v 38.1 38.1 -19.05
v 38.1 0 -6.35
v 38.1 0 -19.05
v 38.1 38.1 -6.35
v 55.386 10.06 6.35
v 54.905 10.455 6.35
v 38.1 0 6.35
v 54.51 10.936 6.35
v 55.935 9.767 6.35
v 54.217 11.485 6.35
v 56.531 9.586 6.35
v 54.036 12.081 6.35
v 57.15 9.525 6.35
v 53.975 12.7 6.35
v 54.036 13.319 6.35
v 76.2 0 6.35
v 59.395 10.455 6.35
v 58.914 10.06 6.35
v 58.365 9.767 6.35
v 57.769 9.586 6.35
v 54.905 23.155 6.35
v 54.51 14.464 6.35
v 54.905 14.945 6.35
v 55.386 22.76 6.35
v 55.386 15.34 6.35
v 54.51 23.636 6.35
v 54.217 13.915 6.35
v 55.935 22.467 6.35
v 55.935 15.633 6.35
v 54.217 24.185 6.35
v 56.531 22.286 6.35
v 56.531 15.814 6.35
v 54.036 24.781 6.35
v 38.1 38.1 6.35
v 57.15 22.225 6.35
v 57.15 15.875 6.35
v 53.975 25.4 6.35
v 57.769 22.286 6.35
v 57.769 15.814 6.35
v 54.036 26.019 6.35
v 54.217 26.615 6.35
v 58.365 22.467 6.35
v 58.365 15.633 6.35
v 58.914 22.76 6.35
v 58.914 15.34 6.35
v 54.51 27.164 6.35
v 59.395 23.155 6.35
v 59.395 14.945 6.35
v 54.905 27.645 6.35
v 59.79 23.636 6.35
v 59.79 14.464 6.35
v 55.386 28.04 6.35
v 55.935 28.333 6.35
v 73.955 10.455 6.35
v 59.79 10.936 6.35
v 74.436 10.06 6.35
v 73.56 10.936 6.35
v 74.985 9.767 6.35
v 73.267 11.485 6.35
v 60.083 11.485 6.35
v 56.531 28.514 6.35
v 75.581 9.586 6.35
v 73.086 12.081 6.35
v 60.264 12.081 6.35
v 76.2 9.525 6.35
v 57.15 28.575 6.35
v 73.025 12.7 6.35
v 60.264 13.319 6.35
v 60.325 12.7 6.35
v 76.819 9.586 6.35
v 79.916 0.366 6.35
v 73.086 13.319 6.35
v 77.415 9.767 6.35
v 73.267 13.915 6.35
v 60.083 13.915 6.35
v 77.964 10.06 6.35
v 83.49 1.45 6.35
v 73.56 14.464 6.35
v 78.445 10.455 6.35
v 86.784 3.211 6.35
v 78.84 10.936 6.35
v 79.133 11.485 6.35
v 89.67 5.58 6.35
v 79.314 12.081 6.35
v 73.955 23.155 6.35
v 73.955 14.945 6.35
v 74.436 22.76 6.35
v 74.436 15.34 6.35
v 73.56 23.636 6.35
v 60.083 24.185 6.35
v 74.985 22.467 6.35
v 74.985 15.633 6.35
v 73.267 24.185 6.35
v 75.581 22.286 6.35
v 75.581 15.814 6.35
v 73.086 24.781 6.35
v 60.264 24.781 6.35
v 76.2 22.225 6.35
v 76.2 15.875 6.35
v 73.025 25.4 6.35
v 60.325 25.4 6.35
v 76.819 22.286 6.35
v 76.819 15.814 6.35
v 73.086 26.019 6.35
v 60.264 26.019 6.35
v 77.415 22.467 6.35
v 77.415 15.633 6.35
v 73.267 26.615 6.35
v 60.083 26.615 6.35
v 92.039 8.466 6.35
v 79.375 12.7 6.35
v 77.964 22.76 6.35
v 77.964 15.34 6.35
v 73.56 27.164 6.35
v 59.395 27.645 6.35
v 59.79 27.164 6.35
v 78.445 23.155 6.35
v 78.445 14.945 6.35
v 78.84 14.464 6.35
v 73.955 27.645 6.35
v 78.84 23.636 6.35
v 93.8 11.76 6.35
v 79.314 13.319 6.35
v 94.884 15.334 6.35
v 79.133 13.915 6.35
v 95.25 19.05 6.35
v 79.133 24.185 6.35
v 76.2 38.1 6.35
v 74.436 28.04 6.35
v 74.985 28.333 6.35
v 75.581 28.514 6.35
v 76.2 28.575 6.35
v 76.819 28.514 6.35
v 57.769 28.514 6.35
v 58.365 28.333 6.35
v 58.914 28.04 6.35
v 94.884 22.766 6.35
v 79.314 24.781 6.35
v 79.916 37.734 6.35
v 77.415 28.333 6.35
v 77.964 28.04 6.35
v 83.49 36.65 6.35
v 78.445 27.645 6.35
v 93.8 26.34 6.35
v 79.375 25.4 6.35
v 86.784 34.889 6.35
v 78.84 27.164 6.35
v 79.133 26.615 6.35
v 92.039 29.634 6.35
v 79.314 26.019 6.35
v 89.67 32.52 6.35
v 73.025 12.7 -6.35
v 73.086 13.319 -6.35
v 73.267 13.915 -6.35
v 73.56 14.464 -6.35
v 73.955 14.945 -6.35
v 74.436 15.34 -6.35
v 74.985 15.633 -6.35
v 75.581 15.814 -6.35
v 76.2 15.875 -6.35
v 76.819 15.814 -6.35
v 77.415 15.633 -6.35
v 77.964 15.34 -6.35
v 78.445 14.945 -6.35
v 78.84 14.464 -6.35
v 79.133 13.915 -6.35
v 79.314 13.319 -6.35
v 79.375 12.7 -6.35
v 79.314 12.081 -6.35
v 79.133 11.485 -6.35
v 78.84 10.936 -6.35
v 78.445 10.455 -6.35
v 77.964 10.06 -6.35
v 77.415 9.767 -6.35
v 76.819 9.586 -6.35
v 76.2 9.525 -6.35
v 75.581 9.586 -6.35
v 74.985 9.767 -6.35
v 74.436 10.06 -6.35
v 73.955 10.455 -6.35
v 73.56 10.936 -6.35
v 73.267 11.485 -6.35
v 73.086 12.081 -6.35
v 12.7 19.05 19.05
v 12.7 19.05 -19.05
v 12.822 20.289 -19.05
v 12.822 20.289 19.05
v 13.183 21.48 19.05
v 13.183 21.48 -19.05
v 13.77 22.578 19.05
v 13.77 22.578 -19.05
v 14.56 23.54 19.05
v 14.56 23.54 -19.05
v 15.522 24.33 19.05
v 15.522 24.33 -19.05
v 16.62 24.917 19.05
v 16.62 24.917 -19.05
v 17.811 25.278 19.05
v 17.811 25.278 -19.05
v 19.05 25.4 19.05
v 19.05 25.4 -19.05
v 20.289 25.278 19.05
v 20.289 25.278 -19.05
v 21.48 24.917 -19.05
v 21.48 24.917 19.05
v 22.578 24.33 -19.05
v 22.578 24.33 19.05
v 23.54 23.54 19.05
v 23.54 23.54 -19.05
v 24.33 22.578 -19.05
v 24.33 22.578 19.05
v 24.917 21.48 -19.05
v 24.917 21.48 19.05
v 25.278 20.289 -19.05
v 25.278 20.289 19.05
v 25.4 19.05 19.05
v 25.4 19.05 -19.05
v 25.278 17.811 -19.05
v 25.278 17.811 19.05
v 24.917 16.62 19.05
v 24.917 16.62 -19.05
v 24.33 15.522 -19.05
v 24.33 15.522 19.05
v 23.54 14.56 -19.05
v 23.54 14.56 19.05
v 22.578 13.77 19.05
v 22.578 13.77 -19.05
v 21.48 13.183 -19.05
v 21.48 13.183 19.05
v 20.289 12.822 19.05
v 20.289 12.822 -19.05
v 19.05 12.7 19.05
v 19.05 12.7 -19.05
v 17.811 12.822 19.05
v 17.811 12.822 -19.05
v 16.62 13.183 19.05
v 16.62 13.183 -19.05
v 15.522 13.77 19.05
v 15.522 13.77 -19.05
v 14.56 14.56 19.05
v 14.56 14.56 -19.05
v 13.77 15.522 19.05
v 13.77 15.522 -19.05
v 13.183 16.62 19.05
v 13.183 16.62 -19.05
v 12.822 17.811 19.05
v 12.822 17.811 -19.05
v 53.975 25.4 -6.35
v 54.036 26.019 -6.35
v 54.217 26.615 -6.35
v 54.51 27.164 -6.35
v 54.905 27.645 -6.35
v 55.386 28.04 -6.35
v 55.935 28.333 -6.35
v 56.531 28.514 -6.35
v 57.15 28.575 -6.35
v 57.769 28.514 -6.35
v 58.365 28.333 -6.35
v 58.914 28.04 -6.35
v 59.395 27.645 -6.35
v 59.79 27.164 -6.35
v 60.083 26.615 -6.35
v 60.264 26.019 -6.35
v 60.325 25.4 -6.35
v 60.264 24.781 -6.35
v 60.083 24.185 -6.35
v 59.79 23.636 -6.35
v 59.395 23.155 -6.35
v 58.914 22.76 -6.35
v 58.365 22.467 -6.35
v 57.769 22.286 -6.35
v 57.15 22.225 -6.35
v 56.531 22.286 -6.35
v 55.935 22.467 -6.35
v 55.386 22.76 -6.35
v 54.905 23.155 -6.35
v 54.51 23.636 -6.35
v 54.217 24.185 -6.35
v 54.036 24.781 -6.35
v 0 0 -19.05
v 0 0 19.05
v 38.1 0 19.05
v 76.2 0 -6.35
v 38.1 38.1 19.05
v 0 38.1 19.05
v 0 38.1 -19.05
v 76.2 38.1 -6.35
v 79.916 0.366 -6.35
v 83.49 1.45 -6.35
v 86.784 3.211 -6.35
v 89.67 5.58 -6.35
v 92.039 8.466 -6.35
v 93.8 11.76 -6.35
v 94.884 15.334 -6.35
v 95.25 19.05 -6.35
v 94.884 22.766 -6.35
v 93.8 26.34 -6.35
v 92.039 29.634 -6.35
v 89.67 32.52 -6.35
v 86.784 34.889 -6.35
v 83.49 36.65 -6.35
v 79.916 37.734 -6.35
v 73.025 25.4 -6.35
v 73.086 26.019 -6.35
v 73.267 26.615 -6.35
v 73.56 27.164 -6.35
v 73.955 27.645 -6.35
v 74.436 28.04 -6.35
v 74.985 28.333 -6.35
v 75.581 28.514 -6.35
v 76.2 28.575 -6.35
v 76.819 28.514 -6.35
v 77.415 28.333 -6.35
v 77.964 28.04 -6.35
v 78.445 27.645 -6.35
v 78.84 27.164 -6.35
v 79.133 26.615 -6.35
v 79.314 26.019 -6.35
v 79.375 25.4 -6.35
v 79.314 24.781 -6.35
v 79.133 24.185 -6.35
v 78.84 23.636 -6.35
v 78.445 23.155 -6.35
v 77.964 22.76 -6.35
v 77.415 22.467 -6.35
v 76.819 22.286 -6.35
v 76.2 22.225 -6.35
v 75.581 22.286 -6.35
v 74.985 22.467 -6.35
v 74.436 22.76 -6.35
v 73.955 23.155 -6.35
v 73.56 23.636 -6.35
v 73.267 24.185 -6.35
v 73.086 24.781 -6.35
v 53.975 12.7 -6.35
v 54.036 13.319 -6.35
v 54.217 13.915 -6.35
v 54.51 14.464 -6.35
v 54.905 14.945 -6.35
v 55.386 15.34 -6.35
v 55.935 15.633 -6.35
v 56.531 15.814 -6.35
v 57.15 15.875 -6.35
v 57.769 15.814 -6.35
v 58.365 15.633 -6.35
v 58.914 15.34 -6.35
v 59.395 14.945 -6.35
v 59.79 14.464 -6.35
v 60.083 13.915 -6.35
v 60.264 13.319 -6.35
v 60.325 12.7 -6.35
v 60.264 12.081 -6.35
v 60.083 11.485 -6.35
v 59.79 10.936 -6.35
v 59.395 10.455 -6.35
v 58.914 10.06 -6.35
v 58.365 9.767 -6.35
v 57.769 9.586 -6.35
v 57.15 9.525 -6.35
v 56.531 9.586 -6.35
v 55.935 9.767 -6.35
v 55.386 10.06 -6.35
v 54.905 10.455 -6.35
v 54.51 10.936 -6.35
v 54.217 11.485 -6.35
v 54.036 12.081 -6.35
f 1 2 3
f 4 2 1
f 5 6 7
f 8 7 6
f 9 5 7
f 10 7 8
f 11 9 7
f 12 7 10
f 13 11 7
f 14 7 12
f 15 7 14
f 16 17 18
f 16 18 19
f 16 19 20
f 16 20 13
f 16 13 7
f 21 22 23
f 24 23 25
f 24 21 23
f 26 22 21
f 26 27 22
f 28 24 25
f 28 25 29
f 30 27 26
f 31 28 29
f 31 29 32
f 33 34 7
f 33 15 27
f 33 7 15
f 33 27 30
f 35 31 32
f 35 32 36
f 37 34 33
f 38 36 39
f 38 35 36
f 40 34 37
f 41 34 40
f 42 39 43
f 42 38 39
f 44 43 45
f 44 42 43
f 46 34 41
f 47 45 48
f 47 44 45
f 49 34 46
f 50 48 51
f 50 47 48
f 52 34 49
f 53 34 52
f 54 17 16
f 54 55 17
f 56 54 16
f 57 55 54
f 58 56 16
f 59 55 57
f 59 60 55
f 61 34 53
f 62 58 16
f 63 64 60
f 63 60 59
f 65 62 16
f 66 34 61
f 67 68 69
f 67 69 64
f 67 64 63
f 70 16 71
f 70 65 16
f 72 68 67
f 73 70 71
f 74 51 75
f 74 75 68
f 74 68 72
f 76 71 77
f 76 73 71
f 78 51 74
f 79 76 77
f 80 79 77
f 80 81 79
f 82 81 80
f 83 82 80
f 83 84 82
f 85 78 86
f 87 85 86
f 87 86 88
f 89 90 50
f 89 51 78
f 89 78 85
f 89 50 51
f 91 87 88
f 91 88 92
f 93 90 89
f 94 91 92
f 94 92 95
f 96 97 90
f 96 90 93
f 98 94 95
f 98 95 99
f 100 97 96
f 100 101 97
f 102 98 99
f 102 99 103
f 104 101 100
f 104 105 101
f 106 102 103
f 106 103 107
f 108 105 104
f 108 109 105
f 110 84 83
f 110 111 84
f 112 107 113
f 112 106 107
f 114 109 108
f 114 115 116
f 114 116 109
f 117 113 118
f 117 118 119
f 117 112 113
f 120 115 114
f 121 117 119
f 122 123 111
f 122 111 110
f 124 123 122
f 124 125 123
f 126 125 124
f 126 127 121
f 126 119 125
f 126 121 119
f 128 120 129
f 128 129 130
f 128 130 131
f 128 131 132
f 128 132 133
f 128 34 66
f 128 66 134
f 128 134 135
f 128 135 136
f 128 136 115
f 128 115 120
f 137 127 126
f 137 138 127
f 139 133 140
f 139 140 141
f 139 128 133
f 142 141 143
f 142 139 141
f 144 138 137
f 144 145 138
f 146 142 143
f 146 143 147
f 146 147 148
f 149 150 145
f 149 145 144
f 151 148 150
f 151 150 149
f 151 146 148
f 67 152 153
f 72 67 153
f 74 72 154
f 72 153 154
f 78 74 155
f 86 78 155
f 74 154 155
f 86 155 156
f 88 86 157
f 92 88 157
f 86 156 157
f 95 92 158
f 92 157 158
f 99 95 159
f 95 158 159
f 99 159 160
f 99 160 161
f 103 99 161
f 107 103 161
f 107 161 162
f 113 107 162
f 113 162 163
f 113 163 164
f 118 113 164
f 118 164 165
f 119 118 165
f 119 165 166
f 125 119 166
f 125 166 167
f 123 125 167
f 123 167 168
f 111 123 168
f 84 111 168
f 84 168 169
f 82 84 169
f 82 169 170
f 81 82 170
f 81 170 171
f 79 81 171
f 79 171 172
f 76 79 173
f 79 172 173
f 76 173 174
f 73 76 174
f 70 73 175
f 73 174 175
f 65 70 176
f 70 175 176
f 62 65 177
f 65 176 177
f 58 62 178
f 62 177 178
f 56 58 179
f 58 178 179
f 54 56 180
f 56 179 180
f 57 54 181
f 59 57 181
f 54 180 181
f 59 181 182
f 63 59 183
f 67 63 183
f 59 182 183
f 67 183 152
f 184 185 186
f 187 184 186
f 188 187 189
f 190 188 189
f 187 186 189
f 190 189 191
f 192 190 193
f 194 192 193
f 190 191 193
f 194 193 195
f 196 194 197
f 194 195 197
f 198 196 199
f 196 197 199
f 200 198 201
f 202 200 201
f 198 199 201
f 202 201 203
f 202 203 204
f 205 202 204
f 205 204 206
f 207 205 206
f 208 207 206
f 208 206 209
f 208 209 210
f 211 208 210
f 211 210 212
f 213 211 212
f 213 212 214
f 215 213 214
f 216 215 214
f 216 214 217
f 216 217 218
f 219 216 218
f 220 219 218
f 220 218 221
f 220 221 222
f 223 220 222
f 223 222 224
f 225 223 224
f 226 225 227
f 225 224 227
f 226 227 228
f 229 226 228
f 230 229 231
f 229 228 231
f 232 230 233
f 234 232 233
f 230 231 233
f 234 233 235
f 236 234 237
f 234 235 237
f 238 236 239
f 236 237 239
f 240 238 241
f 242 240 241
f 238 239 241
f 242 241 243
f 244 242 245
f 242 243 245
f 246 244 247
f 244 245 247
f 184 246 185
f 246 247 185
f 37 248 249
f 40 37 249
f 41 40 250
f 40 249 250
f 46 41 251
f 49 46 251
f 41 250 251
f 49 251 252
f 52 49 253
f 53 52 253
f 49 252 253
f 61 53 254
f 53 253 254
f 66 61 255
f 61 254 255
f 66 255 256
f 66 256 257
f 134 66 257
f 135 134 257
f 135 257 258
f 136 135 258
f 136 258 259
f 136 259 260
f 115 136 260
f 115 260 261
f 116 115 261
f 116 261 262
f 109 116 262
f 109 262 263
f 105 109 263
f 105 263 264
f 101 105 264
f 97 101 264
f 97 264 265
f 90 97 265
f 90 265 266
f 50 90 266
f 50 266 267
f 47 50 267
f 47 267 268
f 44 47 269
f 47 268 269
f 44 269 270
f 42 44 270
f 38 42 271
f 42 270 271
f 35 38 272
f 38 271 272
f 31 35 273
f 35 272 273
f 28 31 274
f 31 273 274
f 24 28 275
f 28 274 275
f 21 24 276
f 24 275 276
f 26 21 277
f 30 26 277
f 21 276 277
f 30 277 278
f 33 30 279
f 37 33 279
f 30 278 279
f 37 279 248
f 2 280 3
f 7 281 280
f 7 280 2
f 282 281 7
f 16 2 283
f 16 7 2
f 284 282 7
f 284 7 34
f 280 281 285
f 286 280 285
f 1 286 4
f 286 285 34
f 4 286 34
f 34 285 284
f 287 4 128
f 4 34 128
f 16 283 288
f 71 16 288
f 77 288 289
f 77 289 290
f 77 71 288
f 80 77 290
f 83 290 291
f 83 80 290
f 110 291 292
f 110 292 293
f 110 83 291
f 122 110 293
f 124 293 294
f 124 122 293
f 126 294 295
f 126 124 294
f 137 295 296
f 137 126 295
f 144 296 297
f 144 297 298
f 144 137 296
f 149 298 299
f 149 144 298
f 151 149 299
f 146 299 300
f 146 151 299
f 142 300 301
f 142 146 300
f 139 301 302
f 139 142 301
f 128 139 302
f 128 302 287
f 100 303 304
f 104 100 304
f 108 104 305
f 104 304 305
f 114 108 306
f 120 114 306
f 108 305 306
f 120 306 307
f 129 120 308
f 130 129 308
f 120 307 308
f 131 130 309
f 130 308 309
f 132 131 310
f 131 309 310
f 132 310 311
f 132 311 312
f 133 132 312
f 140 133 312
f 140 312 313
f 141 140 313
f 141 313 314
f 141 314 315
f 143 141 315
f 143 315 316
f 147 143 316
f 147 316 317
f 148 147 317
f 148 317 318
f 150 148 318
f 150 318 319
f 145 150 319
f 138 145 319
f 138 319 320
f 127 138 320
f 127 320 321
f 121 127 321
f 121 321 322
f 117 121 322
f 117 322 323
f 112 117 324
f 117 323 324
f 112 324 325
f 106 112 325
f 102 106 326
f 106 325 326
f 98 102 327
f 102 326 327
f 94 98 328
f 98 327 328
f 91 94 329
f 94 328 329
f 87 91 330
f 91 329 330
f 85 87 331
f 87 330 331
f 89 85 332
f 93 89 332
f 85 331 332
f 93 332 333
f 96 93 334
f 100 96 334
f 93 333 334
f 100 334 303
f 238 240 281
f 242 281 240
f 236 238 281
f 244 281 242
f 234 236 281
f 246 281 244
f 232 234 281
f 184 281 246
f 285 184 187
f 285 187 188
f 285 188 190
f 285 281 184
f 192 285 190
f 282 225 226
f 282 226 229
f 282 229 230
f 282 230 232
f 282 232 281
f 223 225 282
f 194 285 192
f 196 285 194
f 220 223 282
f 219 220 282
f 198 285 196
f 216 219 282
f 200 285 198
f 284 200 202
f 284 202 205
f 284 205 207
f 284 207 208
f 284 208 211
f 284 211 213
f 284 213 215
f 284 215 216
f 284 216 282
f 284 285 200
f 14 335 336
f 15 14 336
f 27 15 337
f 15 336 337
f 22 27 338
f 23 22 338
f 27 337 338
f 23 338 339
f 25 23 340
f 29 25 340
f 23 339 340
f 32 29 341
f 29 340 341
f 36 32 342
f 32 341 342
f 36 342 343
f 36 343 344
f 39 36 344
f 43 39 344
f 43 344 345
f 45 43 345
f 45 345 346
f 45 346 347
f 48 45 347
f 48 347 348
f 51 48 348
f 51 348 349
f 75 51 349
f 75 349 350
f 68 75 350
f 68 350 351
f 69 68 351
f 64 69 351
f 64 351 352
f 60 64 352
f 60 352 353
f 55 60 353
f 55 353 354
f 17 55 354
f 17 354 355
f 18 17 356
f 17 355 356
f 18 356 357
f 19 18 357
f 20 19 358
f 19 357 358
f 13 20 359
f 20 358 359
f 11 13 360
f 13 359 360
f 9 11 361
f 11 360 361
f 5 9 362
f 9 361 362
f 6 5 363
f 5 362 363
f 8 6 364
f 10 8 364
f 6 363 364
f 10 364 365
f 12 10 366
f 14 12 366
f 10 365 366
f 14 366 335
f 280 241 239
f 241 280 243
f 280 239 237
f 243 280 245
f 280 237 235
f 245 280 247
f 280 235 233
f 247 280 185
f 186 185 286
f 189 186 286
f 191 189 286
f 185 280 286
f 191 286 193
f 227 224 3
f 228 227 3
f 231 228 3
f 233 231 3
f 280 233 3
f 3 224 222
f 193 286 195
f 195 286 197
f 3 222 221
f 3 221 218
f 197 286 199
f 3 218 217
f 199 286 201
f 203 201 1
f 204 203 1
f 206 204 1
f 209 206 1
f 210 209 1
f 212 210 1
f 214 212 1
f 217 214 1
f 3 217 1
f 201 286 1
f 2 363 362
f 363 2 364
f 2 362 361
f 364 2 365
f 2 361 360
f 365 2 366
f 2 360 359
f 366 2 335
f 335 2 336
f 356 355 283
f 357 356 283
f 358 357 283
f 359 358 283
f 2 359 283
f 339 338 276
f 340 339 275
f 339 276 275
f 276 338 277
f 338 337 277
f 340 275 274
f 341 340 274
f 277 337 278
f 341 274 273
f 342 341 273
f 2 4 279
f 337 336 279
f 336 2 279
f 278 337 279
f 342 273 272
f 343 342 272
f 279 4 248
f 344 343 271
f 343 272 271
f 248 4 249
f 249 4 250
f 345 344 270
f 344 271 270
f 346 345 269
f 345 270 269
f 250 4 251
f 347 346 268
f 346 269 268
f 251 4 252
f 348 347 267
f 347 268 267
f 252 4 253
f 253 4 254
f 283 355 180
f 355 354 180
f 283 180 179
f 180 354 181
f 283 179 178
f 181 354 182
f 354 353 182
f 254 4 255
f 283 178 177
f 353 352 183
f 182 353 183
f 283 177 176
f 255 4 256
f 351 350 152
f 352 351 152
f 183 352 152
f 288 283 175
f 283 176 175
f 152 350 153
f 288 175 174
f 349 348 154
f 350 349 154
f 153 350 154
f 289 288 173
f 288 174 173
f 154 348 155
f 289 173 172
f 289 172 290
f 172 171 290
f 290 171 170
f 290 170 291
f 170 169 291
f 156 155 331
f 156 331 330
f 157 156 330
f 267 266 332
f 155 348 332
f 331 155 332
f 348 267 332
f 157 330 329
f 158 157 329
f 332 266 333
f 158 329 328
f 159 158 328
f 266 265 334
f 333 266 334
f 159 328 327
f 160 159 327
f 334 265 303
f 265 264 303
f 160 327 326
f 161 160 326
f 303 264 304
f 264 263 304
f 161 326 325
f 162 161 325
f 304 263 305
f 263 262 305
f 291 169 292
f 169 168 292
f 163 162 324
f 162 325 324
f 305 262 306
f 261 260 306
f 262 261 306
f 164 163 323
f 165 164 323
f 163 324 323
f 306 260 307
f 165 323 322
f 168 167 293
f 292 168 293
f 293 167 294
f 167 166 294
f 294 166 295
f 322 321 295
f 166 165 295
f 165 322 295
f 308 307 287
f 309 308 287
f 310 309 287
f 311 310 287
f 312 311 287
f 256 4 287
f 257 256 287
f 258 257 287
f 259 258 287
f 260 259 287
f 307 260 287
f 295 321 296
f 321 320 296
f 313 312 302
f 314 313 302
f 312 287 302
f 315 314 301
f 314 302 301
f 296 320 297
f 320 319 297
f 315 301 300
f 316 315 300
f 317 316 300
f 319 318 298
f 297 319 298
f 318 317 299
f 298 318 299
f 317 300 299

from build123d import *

# Parameters (mm, degrees)
F0_W     = 38.1
F0_H     = 38.1
F1_DEPTH = 19.05
F2_DEPTH = 6.35
F4_D     = 6.35
F5_D     = 12.7


with BuildPart() as f1:
    # F0 (on Top) → F1 (new body, symmetric)
    with BuildSketch(Plane.XY):
        with Locations((19.05, 19.05)):
            Rectangle(F0_W, F0_H)
    extrude(amount=F1_DEPTH, both=True)

    # F0 (on Top) → F2 (join, symmetric)
    with BuildSketch(Plane.XY):
        with BuildLine():
            Line((38.1, 38.1), (38.1, 0))
            Line((38.1, 0), (76.2, 0))
            ThreePointArc((76.2, 0), (95.25, 19.05), (76.2, 38.1))
            Line((76.2, 38.1), (38.1, 38.1))
        make_face()
    extrude(amount=F2_DEPTH, both=True)

    # F4 (through all)
    with Locations(Plane.XY.offset(19.05)):
        with Locations((57.15, 25.4), (57.15, 12.7), (76.2, 12.7), (76.2, 25.4)):
            Hole(F4_D / 2)

    # F5 (through all)
    with Locations(Plane.XY.offset(19.05)):
        with Locations((19.05, 19.05)):
            Hole(F5_D / 2)


solid = f1.part
